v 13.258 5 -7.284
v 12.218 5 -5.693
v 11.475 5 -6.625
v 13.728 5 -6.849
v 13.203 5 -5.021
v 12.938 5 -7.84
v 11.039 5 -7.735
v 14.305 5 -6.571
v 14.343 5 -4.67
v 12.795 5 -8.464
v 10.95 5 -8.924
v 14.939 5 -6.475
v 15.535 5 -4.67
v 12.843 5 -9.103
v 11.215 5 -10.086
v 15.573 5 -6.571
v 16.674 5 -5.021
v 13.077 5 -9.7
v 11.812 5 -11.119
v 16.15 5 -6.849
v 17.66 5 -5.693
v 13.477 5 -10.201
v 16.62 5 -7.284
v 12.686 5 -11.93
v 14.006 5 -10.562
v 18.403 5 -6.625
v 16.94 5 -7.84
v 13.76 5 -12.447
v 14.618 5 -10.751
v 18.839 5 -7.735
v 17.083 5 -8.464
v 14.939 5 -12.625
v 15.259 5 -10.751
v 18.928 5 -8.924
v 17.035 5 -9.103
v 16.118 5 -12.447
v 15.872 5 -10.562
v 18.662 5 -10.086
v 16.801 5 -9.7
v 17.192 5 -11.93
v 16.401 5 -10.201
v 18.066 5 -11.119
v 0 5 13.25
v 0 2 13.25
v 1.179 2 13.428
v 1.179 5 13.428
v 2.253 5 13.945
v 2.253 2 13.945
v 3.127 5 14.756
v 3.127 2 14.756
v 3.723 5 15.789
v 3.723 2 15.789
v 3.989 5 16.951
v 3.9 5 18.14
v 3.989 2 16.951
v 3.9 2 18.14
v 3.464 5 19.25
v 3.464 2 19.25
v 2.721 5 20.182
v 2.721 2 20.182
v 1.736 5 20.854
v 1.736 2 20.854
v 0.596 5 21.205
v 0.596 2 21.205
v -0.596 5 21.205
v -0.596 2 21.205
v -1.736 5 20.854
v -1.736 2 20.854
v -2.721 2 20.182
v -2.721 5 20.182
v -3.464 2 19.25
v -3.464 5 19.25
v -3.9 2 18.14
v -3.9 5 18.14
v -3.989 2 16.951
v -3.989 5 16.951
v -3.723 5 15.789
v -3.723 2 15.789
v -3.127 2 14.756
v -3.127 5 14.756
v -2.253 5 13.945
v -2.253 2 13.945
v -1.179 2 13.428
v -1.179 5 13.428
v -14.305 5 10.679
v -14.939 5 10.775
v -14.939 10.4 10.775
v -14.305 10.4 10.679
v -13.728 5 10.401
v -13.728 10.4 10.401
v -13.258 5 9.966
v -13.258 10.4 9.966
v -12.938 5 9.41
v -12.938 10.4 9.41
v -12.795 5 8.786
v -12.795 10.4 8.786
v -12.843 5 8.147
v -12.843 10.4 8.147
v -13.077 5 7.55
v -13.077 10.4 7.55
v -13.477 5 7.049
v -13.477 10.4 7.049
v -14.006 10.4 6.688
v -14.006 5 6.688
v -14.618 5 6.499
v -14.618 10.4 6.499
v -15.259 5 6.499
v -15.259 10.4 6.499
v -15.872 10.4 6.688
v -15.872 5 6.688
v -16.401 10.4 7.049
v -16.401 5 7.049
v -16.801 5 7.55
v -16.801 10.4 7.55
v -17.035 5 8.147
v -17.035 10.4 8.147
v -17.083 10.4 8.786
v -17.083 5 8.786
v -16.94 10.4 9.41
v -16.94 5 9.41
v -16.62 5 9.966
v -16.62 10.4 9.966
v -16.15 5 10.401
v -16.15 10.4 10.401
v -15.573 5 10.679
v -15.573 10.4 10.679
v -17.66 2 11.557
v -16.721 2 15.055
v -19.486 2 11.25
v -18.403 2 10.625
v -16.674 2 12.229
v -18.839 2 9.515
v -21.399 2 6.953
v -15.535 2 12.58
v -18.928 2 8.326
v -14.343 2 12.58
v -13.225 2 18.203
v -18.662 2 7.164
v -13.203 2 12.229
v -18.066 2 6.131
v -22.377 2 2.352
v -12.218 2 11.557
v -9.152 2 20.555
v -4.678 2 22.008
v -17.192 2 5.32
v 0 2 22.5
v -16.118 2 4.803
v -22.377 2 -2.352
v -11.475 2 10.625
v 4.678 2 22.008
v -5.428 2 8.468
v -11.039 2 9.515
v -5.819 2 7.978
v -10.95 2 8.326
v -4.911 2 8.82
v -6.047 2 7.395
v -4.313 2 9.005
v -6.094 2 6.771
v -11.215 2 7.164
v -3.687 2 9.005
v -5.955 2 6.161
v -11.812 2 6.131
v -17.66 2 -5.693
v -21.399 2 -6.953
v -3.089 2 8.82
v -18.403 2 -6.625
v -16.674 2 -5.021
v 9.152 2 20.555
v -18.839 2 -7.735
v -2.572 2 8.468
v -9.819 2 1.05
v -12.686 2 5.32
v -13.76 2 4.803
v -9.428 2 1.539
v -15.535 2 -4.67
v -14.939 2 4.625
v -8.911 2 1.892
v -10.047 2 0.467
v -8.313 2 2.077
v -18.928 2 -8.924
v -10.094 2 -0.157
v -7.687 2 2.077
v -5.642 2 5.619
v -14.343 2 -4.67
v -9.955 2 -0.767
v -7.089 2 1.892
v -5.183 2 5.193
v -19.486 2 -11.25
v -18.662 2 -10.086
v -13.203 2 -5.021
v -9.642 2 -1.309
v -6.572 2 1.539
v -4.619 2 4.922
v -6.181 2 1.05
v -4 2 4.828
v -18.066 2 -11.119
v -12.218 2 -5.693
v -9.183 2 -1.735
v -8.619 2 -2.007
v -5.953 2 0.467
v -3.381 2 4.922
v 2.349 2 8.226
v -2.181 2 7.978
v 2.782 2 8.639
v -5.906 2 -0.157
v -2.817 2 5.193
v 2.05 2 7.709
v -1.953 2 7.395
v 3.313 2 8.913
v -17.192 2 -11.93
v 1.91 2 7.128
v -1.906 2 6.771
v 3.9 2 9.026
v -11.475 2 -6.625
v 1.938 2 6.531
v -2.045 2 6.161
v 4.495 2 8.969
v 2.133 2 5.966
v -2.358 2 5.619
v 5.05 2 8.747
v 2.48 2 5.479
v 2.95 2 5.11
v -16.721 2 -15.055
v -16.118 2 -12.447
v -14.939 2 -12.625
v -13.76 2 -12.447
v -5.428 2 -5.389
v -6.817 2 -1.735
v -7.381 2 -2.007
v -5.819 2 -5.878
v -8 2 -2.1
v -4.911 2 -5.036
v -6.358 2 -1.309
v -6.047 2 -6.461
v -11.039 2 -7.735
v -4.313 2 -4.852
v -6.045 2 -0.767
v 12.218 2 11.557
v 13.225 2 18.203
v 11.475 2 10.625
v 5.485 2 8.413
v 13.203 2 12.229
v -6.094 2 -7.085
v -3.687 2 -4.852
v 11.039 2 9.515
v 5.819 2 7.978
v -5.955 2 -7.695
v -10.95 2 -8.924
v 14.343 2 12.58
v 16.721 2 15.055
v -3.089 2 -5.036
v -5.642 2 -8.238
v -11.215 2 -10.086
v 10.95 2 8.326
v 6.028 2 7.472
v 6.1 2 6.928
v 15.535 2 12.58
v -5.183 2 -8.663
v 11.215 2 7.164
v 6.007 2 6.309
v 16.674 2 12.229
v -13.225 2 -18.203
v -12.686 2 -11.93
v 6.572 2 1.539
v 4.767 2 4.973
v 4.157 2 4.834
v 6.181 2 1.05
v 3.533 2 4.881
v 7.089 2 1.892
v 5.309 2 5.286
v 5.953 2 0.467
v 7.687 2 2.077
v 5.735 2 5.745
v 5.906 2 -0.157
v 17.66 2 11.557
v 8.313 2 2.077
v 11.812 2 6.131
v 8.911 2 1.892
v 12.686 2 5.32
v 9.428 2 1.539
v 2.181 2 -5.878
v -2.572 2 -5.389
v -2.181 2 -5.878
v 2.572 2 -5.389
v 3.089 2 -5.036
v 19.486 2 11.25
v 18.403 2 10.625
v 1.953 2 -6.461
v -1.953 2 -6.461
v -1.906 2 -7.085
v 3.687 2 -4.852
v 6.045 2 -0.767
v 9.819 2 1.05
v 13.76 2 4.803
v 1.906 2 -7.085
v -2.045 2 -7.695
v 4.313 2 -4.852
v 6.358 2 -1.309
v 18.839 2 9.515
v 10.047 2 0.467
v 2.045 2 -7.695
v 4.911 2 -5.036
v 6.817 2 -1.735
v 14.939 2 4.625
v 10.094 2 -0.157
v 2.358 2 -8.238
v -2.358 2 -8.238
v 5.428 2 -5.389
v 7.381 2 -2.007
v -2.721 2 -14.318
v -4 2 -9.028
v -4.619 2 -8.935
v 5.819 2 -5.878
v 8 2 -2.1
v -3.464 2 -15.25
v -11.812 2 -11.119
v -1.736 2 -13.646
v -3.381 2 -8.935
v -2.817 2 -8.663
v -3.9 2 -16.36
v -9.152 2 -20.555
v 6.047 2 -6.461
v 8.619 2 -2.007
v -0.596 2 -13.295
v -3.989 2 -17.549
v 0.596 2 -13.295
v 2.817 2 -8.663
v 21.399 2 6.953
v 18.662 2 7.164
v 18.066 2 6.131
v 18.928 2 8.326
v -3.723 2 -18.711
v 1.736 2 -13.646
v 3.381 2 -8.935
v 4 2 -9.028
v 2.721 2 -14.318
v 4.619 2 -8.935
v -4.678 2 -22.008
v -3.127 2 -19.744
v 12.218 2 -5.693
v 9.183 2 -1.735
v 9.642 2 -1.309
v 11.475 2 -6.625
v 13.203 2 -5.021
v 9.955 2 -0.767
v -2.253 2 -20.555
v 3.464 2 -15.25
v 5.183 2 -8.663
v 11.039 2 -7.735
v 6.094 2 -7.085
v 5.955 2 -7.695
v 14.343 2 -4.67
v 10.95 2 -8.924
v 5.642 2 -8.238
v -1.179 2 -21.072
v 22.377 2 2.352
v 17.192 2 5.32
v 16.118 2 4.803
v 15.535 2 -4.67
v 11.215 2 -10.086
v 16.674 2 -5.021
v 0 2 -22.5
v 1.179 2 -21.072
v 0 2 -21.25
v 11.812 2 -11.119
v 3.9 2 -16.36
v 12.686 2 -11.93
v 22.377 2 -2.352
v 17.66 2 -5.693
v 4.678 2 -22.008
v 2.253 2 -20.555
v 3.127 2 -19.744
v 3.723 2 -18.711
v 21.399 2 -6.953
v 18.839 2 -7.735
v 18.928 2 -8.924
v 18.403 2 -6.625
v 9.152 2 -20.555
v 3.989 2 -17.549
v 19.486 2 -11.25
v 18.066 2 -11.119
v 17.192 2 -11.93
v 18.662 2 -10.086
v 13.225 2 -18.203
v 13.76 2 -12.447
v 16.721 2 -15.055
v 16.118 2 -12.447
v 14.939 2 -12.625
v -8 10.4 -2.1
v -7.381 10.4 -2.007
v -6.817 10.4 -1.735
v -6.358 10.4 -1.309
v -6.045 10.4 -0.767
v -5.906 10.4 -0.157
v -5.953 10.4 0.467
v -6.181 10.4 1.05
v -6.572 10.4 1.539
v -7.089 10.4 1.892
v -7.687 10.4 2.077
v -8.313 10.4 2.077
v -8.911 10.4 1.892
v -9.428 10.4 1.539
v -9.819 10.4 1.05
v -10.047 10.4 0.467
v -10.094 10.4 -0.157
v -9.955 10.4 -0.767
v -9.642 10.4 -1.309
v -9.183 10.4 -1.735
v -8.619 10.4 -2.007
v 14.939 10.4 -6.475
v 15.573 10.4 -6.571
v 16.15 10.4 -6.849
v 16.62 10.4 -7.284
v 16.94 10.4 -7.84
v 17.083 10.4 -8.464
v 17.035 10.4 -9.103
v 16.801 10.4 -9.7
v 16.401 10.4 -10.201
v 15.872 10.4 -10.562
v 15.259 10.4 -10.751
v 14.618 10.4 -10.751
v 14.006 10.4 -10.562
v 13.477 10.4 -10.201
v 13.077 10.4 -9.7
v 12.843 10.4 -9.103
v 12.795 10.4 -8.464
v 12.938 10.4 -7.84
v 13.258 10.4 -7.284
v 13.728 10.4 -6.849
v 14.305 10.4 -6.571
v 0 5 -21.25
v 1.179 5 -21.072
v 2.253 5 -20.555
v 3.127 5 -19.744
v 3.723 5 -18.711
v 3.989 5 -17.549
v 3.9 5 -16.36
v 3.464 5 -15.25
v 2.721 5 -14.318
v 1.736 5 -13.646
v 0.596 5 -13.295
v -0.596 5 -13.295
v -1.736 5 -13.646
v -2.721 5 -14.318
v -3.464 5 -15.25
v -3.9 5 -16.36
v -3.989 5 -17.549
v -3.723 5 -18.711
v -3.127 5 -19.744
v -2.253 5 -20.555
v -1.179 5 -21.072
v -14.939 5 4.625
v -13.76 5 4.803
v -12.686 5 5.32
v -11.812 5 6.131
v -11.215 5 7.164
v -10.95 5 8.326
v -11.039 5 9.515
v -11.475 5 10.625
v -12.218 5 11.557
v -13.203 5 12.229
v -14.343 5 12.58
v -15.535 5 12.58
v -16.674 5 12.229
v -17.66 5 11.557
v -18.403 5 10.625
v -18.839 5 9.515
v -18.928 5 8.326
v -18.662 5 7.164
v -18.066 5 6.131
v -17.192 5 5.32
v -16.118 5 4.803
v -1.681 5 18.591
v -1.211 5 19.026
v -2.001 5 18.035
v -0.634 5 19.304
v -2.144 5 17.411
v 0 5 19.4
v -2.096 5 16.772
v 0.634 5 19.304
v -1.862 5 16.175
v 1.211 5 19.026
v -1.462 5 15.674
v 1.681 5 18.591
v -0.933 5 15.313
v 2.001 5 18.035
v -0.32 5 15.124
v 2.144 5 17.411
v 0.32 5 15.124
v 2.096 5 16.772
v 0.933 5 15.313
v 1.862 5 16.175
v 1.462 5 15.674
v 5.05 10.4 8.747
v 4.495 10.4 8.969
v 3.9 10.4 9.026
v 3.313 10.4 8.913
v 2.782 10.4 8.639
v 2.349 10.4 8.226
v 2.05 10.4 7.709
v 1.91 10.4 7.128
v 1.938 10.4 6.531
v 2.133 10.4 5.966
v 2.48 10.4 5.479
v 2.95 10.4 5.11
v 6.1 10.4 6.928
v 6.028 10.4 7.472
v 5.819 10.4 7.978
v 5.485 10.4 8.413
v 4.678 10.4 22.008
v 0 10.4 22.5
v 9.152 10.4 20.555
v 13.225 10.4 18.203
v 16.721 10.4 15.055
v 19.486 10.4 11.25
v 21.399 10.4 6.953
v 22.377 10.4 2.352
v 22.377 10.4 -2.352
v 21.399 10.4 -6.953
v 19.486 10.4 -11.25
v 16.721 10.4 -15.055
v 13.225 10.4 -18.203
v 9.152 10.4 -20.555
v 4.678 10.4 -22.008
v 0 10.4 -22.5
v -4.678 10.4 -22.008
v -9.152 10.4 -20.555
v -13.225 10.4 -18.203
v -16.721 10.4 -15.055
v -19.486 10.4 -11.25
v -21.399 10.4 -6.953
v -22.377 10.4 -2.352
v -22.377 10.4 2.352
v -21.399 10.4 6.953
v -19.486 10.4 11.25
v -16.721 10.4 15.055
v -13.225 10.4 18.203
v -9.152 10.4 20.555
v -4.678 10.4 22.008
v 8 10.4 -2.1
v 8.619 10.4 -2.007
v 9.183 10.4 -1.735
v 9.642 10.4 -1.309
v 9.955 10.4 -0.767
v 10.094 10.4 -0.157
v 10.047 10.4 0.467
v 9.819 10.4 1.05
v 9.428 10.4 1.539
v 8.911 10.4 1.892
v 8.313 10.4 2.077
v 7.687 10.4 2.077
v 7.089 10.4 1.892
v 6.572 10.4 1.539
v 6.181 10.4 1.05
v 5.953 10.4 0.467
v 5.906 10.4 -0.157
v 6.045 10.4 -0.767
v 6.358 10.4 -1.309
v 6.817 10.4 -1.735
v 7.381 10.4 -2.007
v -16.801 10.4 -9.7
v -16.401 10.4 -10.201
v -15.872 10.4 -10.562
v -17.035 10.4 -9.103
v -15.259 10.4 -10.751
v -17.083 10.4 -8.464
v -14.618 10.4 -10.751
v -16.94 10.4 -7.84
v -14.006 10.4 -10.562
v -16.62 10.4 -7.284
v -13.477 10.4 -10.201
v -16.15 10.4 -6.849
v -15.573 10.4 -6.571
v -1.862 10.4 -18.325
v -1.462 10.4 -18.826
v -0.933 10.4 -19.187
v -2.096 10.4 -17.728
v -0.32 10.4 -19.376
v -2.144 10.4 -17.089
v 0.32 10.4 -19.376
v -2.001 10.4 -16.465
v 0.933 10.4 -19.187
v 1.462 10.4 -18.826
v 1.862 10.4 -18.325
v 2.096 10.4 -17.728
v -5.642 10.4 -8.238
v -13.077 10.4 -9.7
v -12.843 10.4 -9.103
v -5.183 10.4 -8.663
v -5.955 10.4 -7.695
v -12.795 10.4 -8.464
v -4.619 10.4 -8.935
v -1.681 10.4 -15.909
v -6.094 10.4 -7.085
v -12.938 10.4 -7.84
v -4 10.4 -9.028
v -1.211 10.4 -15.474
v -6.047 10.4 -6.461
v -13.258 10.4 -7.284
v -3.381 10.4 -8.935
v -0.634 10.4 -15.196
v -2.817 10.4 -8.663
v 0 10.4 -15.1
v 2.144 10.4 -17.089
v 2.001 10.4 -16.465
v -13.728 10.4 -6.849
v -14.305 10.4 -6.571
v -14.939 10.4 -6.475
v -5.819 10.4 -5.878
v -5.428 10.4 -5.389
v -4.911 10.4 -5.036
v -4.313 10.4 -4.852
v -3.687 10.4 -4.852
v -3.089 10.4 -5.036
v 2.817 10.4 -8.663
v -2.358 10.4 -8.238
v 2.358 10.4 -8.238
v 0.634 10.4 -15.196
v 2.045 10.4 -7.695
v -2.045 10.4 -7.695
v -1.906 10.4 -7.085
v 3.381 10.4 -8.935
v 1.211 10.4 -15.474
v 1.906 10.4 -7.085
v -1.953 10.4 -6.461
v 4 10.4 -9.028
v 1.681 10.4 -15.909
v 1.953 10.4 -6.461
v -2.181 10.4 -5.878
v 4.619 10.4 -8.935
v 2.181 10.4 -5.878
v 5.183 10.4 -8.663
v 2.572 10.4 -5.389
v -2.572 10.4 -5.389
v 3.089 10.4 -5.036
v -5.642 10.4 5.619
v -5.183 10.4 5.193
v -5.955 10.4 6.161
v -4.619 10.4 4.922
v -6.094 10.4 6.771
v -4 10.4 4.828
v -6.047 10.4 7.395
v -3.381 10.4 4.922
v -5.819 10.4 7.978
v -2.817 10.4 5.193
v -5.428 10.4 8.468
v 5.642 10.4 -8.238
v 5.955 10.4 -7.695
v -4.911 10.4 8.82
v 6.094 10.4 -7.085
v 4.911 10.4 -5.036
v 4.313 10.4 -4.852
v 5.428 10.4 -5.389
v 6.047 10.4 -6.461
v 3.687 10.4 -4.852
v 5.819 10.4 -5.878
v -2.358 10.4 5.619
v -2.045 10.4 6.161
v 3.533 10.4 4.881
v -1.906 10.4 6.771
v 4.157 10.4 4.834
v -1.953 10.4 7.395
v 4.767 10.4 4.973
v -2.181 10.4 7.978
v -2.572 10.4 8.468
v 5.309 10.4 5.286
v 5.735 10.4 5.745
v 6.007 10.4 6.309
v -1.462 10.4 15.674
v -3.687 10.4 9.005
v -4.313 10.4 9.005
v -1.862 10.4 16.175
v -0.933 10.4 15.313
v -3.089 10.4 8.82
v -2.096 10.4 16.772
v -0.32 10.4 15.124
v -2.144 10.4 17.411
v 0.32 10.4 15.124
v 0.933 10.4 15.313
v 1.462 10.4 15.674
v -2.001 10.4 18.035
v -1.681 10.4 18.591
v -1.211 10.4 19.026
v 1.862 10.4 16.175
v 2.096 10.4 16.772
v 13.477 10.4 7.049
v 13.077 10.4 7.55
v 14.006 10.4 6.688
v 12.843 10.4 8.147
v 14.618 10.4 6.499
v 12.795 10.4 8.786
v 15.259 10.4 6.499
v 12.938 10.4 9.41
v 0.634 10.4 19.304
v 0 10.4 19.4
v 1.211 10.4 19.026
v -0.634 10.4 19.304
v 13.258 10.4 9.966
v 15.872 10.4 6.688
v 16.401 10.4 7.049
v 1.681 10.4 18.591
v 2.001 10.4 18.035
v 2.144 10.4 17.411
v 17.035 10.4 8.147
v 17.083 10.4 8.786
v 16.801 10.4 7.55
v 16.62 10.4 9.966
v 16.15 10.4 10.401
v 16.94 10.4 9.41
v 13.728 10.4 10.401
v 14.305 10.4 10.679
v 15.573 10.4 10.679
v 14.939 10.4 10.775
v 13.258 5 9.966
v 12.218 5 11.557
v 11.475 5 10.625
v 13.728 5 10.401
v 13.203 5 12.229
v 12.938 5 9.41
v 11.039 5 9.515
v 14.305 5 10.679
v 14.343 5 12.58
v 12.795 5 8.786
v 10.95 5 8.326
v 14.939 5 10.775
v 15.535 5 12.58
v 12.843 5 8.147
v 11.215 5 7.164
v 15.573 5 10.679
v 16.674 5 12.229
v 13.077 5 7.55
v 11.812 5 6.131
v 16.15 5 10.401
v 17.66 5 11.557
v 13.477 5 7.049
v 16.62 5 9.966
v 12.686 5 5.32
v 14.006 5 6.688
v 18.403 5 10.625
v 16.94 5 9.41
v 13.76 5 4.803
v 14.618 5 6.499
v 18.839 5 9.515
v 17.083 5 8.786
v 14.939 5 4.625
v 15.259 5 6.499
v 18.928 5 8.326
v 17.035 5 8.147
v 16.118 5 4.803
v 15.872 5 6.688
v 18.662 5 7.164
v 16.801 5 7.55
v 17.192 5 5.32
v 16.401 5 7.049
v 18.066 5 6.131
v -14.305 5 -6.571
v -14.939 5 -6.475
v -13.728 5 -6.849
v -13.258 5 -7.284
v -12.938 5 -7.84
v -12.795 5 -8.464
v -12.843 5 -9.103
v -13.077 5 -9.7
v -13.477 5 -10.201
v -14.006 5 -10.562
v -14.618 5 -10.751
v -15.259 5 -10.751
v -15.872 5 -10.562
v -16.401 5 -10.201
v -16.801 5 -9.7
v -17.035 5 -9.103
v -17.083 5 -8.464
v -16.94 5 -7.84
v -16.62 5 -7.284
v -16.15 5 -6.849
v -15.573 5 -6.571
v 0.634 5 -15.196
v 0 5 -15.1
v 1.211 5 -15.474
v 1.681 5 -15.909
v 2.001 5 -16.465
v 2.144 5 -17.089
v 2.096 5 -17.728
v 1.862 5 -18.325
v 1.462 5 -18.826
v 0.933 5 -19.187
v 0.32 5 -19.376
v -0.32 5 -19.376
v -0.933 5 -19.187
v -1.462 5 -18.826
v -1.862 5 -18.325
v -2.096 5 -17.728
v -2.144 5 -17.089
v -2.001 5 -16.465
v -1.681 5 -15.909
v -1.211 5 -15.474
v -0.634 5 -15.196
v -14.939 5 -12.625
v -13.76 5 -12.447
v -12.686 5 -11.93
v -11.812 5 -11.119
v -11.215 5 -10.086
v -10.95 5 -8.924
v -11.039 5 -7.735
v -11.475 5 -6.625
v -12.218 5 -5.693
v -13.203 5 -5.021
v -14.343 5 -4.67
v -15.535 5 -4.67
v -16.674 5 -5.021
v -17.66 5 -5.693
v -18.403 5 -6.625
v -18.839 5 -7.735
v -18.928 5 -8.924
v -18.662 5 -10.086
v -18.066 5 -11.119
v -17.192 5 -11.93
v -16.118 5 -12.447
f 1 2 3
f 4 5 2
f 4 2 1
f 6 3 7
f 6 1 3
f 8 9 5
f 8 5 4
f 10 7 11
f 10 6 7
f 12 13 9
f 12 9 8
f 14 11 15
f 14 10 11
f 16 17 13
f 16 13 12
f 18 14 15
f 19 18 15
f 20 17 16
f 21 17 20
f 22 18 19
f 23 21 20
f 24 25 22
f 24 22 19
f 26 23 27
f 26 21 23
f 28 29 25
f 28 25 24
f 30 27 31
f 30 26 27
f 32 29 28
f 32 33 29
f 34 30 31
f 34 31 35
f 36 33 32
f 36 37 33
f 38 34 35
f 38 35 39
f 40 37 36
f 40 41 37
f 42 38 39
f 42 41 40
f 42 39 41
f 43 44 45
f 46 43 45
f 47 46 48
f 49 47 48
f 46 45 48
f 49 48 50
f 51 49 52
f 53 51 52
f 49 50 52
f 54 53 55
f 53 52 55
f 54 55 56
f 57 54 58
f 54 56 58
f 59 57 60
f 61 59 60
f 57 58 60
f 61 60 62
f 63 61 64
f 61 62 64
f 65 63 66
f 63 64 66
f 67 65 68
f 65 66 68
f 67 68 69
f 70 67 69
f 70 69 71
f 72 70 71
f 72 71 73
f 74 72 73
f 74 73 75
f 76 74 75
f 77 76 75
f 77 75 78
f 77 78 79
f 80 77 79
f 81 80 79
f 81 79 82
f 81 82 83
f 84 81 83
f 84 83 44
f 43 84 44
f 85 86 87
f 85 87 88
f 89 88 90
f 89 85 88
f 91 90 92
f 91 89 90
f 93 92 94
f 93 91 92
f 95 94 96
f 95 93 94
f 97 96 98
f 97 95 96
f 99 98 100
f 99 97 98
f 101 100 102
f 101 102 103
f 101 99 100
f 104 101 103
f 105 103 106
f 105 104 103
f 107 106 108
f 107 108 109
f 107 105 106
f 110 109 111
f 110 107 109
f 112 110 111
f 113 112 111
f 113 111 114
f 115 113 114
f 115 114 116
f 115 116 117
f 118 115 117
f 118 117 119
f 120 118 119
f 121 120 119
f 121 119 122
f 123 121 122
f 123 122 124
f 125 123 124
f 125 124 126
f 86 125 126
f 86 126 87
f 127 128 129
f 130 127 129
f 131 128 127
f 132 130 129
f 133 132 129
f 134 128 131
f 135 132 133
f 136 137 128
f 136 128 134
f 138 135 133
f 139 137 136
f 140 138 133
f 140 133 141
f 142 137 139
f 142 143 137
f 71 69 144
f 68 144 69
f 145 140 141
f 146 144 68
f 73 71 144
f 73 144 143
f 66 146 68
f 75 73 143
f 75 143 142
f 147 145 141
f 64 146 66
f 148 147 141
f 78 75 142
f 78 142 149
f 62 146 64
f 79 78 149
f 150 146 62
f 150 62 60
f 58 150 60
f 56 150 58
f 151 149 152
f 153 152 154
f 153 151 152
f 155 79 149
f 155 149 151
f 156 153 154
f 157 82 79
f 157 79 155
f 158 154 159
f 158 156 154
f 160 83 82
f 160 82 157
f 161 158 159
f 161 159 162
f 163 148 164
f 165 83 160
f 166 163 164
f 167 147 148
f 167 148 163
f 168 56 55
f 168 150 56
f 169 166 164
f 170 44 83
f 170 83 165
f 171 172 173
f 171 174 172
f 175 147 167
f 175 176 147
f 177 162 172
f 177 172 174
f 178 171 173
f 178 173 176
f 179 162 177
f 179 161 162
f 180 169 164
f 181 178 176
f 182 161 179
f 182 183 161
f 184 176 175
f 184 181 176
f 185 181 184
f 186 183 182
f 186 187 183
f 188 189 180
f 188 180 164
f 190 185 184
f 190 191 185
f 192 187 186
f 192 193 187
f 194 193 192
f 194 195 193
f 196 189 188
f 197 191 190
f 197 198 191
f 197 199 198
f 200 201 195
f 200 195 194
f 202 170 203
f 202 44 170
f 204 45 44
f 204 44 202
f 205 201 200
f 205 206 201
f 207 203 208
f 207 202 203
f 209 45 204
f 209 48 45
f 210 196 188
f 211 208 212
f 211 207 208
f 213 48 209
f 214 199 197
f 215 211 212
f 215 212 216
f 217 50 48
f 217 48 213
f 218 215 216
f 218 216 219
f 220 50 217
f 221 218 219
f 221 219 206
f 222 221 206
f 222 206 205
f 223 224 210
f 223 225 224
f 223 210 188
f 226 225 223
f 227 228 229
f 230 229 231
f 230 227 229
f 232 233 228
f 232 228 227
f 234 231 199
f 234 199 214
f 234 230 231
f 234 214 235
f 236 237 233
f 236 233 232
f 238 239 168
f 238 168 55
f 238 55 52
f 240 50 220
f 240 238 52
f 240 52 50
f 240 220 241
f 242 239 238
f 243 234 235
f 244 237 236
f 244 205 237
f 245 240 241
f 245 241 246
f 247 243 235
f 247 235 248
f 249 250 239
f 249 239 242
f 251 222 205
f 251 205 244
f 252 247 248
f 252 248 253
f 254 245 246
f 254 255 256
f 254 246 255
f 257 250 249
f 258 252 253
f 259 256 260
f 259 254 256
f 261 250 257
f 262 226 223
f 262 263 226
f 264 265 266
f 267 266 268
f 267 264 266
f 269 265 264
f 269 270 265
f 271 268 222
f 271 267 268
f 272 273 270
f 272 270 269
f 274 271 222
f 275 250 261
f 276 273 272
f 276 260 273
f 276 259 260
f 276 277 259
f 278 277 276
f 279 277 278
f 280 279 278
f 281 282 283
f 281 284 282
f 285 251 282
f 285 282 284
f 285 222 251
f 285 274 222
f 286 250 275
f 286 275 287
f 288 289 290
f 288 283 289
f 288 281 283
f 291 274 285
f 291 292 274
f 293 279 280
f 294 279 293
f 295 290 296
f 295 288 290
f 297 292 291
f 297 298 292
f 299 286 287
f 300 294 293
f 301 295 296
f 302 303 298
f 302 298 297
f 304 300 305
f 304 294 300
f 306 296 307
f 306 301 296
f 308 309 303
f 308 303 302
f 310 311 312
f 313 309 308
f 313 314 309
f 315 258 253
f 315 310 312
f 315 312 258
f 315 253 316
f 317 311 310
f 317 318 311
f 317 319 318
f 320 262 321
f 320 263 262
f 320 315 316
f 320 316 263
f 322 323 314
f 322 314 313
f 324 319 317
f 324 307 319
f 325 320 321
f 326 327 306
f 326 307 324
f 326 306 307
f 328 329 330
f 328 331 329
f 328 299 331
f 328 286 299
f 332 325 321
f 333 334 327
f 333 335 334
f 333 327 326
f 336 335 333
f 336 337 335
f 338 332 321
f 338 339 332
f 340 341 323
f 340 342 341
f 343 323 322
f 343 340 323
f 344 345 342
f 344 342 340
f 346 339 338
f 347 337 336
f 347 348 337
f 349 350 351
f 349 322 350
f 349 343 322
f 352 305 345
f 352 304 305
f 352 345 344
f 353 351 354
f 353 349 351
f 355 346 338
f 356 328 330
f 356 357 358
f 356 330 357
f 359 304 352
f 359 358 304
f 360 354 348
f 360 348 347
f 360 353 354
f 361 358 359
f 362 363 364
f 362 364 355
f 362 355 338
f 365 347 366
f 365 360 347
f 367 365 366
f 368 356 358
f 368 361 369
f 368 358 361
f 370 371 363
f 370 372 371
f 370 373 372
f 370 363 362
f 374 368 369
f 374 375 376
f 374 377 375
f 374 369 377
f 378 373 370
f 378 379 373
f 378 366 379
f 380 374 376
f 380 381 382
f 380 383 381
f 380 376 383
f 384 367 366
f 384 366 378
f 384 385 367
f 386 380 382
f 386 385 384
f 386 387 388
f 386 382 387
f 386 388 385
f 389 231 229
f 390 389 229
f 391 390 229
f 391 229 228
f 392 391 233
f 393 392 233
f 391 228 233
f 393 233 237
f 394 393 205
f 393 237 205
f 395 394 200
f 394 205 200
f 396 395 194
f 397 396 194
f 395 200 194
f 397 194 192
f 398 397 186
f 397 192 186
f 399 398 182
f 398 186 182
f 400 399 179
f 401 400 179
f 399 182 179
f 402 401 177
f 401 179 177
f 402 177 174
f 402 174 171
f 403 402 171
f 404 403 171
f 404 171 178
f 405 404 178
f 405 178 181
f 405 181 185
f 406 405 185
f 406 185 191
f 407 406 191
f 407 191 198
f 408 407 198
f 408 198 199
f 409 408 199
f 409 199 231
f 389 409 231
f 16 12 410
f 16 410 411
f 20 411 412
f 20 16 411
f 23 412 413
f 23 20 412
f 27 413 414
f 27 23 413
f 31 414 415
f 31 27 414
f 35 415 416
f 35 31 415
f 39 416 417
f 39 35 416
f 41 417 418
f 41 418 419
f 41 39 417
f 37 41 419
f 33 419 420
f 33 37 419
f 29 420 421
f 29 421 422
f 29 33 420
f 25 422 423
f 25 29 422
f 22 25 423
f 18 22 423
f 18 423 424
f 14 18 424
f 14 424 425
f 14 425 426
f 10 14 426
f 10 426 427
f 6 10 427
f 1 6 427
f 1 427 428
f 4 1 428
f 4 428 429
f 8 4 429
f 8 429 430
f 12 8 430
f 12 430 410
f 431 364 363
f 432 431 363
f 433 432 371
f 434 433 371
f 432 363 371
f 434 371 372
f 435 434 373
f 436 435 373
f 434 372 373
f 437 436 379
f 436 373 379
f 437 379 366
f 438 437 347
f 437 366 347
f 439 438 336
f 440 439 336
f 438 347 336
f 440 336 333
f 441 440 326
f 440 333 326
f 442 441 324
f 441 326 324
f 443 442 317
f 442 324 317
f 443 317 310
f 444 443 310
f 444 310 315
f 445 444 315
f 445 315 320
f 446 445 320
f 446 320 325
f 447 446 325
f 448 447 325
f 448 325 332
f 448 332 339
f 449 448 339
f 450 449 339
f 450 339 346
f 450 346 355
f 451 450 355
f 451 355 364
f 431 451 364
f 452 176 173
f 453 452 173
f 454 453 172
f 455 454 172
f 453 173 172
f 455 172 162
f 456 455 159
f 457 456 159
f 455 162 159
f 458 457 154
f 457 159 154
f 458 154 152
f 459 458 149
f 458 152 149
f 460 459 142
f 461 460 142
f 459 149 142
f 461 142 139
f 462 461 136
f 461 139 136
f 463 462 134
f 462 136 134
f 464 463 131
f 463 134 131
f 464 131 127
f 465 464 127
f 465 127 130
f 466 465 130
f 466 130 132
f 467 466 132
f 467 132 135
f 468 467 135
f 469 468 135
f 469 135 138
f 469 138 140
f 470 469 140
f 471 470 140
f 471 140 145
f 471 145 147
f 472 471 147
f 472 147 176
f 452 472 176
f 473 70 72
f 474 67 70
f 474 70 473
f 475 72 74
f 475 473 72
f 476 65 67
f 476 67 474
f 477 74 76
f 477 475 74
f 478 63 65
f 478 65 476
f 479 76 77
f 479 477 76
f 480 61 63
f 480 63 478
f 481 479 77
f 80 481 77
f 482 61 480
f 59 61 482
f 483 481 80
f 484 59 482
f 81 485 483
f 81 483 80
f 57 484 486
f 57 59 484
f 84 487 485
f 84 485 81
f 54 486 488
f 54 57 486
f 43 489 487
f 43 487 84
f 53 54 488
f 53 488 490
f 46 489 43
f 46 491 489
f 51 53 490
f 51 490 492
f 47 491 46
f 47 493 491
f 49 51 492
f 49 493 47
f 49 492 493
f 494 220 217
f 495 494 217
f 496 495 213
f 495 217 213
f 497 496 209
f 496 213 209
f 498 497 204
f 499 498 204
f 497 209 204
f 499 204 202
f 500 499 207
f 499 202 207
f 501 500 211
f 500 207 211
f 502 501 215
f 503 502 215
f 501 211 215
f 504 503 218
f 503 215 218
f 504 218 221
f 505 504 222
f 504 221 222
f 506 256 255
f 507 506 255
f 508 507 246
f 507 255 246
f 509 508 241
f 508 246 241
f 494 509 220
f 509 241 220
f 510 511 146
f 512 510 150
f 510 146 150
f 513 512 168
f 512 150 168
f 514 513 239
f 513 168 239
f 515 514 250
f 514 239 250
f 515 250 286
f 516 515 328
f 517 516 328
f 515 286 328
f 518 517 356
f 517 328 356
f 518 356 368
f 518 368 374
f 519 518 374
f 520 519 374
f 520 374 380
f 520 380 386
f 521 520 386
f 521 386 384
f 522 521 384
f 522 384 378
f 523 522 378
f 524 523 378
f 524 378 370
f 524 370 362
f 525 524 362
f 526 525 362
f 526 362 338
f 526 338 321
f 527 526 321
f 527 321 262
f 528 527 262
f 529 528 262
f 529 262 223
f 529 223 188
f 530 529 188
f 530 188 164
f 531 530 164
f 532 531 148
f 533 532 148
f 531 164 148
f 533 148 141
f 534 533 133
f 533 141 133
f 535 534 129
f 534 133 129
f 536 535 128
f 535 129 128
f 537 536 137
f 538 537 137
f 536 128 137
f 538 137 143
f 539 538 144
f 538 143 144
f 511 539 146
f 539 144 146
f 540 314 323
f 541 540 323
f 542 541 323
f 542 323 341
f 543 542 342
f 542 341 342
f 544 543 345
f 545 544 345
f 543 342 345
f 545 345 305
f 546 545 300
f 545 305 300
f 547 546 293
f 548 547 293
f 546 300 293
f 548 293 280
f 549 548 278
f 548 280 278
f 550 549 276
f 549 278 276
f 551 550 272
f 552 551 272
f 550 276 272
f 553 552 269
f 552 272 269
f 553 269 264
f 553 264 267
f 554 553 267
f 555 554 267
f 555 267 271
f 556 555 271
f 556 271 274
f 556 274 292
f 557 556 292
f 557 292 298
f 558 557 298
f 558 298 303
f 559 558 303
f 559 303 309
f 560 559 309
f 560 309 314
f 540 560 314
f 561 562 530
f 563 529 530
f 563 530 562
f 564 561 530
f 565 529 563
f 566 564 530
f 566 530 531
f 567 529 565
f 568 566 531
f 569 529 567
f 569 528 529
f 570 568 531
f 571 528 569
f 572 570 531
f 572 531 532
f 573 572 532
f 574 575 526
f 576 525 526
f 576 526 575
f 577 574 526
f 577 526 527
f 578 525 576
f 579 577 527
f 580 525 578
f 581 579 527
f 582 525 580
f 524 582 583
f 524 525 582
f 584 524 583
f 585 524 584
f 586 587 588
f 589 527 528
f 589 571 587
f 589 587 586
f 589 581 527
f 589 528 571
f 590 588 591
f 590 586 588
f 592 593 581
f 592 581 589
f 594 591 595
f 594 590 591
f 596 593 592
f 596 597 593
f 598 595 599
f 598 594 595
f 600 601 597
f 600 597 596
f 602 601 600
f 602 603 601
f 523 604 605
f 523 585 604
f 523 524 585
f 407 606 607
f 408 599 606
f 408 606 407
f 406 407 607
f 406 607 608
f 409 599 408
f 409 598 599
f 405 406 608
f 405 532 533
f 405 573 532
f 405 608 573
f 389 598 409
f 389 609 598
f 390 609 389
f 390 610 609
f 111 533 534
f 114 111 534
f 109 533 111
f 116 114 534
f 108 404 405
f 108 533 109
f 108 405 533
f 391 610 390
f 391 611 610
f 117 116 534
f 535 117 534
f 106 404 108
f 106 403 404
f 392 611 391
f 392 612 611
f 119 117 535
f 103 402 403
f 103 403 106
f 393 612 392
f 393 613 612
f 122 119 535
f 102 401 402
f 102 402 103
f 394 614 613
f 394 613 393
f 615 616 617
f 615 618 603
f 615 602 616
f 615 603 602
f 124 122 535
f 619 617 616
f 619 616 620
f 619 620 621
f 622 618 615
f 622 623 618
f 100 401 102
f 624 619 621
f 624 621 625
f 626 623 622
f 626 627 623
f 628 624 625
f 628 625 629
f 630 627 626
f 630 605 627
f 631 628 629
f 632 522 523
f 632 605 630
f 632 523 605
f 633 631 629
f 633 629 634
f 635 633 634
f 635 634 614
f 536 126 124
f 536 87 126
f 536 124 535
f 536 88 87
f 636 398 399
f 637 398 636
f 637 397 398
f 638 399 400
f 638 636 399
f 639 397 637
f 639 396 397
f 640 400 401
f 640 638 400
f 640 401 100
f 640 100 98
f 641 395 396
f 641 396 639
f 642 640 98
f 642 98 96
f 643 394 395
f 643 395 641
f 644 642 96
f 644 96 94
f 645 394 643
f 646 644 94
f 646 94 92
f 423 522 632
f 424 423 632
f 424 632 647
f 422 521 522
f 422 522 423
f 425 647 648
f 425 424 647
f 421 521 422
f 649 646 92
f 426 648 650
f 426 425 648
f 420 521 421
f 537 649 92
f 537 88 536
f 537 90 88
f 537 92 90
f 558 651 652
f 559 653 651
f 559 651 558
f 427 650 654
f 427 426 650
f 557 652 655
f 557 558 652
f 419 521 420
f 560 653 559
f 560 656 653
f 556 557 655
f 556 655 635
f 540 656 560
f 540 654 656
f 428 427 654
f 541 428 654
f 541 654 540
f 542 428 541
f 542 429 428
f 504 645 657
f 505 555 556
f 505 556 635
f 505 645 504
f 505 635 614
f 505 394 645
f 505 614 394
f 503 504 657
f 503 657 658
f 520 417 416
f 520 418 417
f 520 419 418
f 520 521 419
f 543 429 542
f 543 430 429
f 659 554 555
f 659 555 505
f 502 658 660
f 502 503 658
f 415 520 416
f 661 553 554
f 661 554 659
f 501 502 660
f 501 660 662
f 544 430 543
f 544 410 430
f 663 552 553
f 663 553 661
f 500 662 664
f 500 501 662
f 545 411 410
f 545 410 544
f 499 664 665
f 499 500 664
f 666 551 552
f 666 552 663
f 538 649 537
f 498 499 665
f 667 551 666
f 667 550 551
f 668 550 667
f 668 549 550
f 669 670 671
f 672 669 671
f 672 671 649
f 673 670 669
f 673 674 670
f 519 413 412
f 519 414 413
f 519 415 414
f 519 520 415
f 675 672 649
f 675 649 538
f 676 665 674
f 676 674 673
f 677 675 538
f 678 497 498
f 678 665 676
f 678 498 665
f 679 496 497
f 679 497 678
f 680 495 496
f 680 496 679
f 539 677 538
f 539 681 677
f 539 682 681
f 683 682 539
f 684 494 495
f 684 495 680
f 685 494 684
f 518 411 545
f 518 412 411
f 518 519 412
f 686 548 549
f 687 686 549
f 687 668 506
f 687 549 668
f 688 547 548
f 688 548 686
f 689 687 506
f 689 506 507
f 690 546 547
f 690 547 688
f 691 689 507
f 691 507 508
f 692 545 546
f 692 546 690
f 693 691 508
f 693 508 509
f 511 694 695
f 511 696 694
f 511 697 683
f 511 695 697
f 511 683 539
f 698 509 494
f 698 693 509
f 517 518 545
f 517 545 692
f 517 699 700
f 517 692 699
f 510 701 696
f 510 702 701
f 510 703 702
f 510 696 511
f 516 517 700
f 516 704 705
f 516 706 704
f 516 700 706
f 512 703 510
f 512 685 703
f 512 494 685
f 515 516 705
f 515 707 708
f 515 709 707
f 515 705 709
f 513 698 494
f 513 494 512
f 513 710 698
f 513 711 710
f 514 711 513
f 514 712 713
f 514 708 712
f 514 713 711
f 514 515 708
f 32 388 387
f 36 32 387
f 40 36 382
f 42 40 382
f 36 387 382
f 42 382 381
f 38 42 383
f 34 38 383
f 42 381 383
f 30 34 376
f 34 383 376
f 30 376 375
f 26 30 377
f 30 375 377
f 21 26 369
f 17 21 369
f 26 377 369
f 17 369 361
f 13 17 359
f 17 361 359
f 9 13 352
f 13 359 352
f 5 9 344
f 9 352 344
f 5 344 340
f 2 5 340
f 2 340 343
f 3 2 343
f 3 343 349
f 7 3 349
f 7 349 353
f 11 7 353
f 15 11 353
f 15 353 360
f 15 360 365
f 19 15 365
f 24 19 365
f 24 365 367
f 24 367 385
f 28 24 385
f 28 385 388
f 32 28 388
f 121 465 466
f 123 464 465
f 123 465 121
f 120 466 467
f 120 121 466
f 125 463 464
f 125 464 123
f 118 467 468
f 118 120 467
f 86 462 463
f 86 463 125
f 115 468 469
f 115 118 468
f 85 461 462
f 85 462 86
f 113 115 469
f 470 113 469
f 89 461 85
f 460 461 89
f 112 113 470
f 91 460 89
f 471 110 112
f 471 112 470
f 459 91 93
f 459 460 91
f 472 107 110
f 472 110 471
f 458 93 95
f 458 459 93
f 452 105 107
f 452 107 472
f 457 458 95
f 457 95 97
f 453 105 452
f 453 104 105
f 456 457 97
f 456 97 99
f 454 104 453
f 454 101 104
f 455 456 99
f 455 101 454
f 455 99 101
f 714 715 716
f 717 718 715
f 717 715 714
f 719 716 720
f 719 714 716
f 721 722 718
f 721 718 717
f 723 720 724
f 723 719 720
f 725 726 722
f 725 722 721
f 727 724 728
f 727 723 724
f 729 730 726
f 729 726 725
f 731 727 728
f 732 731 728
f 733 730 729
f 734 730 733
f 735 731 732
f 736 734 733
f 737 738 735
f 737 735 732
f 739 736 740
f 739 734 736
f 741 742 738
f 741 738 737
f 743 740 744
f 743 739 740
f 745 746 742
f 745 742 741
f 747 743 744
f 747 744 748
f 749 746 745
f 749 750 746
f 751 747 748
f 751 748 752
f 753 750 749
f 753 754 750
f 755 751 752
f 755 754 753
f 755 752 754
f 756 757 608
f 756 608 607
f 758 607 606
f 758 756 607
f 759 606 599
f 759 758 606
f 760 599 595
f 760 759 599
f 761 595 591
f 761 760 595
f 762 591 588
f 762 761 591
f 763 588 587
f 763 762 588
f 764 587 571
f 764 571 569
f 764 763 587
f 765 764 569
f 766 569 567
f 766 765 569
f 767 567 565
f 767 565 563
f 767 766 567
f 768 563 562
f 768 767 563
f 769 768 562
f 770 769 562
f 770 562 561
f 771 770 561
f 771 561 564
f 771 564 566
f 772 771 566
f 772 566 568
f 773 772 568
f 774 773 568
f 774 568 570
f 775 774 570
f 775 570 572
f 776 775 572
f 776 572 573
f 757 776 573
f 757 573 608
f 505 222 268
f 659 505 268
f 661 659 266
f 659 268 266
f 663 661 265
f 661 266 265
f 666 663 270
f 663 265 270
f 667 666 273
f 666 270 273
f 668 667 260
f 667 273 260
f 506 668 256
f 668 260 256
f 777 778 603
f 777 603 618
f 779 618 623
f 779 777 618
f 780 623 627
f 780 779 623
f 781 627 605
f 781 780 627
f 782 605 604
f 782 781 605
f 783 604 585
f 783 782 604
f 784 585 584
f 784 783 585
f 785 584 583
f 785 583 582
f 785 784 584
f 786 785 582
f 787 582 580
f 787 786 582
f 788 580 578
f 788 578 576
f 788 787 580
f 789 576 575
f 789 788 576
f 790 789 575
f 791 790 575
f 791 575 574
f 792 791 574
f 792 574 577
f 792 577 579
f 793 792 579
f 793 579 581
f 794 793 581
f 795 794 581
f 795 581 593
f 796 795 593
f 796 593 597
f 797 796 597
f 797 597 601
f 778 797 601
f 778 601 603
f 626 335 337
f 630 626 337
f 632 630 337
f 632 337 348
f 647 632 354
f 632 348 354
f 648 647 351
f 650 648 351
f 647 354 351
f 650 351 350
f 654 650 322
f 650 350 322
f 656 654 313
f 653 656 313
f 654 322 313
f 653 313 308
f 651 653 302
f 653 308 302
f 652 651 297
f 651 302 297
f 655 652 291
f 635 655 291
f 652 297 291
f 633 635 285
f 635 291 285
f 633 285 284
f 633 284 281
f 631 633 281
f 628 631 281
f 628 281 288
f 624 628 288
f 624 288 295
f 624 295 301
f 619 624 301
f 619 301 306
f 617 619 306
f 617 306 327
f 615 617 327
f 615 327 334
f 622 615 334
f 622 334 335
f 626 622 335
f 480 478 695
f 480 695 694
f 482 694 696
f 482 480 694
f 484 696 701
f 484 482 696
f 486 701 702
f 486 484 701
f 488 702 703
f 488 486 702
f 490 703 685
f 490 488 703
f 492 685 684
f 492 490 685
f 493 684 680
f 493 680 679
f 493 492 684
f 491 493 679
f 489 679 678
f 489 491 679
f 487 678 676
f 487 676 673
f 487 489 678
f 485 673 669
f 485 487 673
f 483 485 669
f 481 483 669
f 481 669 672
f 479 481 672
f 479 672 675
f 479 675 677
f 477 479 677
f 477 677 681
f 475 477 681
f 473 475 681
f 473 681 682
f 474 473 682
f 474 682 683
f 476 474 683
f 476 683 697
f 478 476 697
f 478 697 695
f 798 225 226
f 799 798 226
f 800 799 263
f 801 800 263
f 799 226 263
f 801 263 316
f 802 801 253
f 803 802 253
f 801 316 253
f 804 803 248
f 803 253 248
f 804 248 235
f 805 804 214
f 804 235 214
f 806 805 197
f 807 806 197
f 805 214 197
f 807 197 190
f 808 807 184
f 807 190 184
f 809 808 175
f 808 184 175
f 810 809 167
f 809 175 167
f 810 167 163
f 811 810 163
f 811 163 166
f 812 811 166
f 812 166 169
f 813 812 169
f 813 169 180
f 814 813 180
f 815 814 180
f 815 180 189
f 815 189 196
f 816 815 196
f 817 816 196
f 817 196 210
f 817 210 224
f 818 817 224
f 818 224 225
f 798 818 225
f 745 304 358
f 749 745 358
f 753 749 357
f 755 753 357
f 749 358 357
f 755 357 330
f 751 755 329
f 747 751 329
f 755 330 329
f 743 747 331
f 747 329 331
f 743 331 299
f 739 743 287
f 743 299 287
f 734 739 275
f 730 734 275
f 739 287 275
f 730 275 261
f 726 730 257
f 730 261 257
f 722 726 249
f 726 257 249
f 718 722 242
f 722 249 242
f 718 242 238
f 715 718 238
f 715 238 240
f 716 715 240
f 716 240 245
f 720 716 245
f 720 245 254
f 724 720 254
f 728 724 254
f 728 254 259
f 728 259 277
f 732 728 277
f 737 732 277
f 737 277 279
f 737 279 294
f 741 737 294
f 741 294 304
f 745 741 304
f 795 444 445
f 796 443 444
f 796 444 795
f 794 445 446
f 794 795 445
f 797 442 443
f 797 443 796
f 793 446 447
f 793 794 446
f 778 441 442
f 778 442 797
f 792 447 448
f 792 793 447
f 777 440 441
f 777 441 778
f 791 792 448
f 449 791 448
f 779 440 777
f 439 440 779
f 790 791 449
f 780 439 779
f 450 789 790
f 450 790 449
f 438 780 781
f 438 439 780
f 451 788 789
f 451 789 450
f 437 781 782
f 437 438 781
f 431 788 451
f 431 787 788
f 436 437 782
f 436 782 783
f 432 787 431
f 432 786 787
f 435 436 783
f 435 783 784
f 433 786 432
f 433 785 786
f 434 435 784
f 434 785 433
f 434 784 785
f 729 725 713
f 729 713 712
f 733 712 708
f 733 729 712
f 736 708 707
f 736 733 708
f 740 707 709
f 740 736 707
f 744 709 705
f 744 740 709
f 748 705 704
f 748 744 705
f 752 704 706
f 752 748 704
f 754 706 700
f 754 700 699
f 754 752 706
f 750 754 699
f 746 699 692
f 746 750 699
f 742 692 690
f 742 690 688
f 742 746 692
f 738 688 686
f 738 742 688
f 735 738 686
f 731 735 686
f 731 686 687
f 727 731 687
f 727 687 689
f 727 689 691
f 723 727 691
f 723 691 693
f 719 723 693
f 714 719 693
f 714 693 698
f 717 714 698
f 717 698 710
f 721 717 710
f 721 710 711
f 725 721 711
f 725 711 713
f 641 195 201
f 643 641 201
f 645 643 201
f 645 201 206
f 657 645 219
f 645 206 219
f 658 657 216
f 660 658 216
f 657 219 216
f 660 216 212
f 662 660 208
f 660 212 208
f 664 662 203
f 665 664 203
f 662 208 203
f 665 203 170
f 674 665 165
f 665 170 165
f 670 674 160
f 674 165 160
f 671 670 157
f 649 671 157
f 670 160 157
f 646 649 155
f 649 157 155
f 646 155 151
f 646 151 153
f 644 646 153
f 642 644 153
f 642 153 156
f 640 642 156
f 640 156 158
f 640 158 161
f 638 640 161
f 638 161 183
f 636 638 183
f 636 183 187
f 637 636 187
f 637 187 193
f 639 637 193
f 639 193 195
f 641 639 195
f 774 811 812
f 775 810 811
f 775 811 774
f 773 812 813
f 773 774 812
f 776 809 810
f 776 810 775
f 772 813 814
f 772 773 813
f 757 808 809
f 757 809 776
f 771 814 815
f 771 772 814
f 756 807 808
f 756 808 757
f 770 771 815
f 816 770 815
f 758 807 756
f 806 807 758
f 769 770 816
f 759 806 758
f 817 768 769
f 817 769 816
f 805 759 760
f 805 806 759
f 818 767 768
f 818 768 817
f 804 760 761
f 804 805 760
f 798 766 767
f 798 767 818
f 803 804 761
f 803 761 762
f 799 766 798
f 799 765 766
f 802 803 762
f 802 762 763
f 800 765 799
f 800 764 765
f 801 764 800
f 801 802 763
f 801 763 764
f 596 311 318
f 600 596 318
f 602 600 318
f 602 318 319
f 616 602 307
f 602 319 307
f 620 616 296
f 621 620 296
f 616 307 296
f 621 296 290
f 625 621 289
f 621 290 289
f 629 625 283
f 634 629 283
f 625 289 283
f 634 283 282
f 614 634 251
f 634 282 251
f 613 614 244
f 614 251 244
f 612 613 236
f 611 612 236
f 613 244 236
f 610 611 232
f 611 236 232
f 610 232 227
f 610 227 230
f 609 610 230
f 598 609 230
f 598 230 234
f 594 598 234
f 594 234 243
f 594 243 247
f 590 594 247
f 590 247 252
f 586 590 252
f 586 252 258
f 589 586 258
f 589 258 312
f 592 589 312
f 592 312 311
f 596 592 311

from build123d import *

# Parameters (mm, degrees)
SKETCH_1_R          = 22.5
SKETCH_1_R_2        = 2.15
EXTRUDE_1_DEPTH     = 10.4
SKETCH_3_R          = 4
SKETCH_3_R_2        = 2.15
CUT_EXTRUDE_1_DEPTH = 5
SKETCH_4_R          = 2.1
CUT_EXTRUDE_2_DEPTH = 34.476260245
SKETCH_6_R          = 22.5
CUT_EXTRUDE_3_DEPTH = 2


with BuildPart() as part:
    # 草图1 → 凸台-拉伸1 (new body)
    with BuildSketch(Plane(origin=(0, 0, 0), x_dir=(1, 0, 0), z_dir=(0, 1, 0))):
        with Locations(Location((0, 0, 0), (0, 0, 270))):
            Circle(SKETCH_1_R)
        with Locations(Location((0, 17.25, 0), (0, 0, 270))):
            Circle(SKETCH_1_R_2, mode=Mode.SUBTRACT)
        with Locations(Location((14.938938215, 8.625, 0), (0, 0, 270))):
            Circle(SKETCH_1_R_2, mode=Mode.SUBTRACT)
        with Locations(Location((14.938938215, -8.625, 0), (0, 0, 270))):
            Circle(SKETCH_1_R_2, mode=Mode.SUBTRACT)
        with Locations(Location((0, -17.25, 0), (0, 0, 270))):
            Circle(SKETCH_1_R_2, mode=Mode.SUBTRACT)
        with Locations(Location((-14.938938215, -8.625, 0), (0, 0, 270))):
            Circle(SKETCH_1_R_2, mode=Mode.SUBTRACT)
        with Locations(Location((-14.938938215, 8.625, 0), (0, 0, 270))):
            Circle(SKETCH_1_R_2, mode=Mode.SUBTRACT)
    extrude(amount=EXTRUDE_1_DEPTH)

    # 草图3 → 切除-拉伸1 (cut)
    # profile 1 of 6: a face of its own
    with BuildSketch(Plane.XZ):
        with Locations(Location((0, 17.25, 0), (0, 0, 270))):
            Circle(SKETCH_3_R)
        with Locations(Location((0, 17.25, 0), (0, 0, 270))):
            Circle(SKETCH_3_R_2, mode=Mode.SUBTRACT)
    # profile 2 of 6: a face of its own
    with BuildSketch(Plane.XZ):
        with Locations(Location((14.938938215, 8.625, 0), (0, 0, 270))):
            Circle(SKETCH_3_R)
        with Locations(Location((14.938938215, 8.625, 0), (0, 0, 270))):
            Circle(SKETCH_3_R_2, mode=Mode.SUBTRACT)
    # profile 3 of 6: a face of its own
    with BuildSketch(Plane.XZ):
        with Locations(Location((14.938938215, -8.625, 0), (0, 0, 270))):
            Circle(SKETCH_3_R)
        with Locations(Location((14.938938215, -8.625, 0), (0, 0, 270))):
            Circle(SKETCH_3_R_2, mode=Mode.SUBTRACT)
    # profile 4 of 6: a face of its own
    with BuildSketch(Plane.XZ):
        with Locations(Location((0, -17.25, 0), (0, 0, 270))):
            Circle(SKETCH_3_R)
        with Locations(Location((0, -17.25, 0), (0, 0, 270))):
            Circle(SKETCH_3_R_2, mode=Mode.SUBTRACT)
    # profile 5 of 6: a face of its own
    with BuildSketch(Plane.XZ):
        with Locations(Location((-14.938938215, -8.625, 0), (0, 0, 270))):
            Circle(SKETCH_3_R)
        with Locations(Location((-14.938938215, -8.625, 0), (0, 0, 270))):
            Circle(SKETCH_3_R_2, mode=Mode.SUBTRACT)
    # profile 6 of 6: a face of its own
    with BuildSketch(Plane.XZ):
        with Locations(Location((-14.938938215, 8.625, 0), (0, 0, 270))):
            Circle(SKETCH_3_R)
        with Locations(Location((-14.938938215, 8.625, 0), (0, 0, 270))):
            Circle(SKETCH_3_R_2, mode=Mode.SUBTRACT)
    extrude(amount=-CUT_EXTRUDE_1_DEPTH, mode=Mode.SUBTRACT)

    # 草图4 → 切除-拉伸2 (cut, through all)
    with BuildSketch(Plane.XZ):
        with BuildLine():
            ThreePointArc((5.05, 8.746856578), (2.181346652, 7.97820323), (2.95, 5.109549882))
            Line((2.95, 5.109549882), (5.05, 8.746856578))
        make_face()
        with BuildLine():
            Line((5.05, 8.746856578), (2.95, 5.109549882))
            ThreePointArc((2.95, 5.109549882), (5.05, 5.109549882), (6.1, 6.92820323))
            ThreePointArc((6.1, 6.92820323), (5.818653348, 7.97820323), (5.05, 8.746856578))
        make_face()
        with Locations(Location((8, 0, 0), (0, 0, 270))):
            Circle(SKETCH_4_R)
        with Locations(Location((-4, 6.92820323, 0), (0, 0, 270))):
            Circle(SKETCH_4_R)
        with Locations(Location((-8, 0, 0), (0, 0, 270))):
            Circle(SKETCH_4_R)
        with Locations(Location((-4, -6.92820323, 0), (0, 0, 270))):
            Circle(SKETCH_4_R)
        with Locations(Location((4, -6.92820323, 0), (0, 0, 270))):
            Circle(SKETCH_4_R)
    extrude(amount=-CUT_EXTRUDE_2_DEPTH, mode=Mode.SUBTRACT)

    # 草图6 → 切除-拉伸3 (cut)
    with BuildSketch(Plane.XZ):
        with Locations(Location((0, 0, 0), (0, 0, 270))):
            Circle(SKETCH_6_R)
    extrude(amount=-CUT_EXTRUDE_3_DEPTH, mode=Mode.SUBTRACT)


solid = part.part
